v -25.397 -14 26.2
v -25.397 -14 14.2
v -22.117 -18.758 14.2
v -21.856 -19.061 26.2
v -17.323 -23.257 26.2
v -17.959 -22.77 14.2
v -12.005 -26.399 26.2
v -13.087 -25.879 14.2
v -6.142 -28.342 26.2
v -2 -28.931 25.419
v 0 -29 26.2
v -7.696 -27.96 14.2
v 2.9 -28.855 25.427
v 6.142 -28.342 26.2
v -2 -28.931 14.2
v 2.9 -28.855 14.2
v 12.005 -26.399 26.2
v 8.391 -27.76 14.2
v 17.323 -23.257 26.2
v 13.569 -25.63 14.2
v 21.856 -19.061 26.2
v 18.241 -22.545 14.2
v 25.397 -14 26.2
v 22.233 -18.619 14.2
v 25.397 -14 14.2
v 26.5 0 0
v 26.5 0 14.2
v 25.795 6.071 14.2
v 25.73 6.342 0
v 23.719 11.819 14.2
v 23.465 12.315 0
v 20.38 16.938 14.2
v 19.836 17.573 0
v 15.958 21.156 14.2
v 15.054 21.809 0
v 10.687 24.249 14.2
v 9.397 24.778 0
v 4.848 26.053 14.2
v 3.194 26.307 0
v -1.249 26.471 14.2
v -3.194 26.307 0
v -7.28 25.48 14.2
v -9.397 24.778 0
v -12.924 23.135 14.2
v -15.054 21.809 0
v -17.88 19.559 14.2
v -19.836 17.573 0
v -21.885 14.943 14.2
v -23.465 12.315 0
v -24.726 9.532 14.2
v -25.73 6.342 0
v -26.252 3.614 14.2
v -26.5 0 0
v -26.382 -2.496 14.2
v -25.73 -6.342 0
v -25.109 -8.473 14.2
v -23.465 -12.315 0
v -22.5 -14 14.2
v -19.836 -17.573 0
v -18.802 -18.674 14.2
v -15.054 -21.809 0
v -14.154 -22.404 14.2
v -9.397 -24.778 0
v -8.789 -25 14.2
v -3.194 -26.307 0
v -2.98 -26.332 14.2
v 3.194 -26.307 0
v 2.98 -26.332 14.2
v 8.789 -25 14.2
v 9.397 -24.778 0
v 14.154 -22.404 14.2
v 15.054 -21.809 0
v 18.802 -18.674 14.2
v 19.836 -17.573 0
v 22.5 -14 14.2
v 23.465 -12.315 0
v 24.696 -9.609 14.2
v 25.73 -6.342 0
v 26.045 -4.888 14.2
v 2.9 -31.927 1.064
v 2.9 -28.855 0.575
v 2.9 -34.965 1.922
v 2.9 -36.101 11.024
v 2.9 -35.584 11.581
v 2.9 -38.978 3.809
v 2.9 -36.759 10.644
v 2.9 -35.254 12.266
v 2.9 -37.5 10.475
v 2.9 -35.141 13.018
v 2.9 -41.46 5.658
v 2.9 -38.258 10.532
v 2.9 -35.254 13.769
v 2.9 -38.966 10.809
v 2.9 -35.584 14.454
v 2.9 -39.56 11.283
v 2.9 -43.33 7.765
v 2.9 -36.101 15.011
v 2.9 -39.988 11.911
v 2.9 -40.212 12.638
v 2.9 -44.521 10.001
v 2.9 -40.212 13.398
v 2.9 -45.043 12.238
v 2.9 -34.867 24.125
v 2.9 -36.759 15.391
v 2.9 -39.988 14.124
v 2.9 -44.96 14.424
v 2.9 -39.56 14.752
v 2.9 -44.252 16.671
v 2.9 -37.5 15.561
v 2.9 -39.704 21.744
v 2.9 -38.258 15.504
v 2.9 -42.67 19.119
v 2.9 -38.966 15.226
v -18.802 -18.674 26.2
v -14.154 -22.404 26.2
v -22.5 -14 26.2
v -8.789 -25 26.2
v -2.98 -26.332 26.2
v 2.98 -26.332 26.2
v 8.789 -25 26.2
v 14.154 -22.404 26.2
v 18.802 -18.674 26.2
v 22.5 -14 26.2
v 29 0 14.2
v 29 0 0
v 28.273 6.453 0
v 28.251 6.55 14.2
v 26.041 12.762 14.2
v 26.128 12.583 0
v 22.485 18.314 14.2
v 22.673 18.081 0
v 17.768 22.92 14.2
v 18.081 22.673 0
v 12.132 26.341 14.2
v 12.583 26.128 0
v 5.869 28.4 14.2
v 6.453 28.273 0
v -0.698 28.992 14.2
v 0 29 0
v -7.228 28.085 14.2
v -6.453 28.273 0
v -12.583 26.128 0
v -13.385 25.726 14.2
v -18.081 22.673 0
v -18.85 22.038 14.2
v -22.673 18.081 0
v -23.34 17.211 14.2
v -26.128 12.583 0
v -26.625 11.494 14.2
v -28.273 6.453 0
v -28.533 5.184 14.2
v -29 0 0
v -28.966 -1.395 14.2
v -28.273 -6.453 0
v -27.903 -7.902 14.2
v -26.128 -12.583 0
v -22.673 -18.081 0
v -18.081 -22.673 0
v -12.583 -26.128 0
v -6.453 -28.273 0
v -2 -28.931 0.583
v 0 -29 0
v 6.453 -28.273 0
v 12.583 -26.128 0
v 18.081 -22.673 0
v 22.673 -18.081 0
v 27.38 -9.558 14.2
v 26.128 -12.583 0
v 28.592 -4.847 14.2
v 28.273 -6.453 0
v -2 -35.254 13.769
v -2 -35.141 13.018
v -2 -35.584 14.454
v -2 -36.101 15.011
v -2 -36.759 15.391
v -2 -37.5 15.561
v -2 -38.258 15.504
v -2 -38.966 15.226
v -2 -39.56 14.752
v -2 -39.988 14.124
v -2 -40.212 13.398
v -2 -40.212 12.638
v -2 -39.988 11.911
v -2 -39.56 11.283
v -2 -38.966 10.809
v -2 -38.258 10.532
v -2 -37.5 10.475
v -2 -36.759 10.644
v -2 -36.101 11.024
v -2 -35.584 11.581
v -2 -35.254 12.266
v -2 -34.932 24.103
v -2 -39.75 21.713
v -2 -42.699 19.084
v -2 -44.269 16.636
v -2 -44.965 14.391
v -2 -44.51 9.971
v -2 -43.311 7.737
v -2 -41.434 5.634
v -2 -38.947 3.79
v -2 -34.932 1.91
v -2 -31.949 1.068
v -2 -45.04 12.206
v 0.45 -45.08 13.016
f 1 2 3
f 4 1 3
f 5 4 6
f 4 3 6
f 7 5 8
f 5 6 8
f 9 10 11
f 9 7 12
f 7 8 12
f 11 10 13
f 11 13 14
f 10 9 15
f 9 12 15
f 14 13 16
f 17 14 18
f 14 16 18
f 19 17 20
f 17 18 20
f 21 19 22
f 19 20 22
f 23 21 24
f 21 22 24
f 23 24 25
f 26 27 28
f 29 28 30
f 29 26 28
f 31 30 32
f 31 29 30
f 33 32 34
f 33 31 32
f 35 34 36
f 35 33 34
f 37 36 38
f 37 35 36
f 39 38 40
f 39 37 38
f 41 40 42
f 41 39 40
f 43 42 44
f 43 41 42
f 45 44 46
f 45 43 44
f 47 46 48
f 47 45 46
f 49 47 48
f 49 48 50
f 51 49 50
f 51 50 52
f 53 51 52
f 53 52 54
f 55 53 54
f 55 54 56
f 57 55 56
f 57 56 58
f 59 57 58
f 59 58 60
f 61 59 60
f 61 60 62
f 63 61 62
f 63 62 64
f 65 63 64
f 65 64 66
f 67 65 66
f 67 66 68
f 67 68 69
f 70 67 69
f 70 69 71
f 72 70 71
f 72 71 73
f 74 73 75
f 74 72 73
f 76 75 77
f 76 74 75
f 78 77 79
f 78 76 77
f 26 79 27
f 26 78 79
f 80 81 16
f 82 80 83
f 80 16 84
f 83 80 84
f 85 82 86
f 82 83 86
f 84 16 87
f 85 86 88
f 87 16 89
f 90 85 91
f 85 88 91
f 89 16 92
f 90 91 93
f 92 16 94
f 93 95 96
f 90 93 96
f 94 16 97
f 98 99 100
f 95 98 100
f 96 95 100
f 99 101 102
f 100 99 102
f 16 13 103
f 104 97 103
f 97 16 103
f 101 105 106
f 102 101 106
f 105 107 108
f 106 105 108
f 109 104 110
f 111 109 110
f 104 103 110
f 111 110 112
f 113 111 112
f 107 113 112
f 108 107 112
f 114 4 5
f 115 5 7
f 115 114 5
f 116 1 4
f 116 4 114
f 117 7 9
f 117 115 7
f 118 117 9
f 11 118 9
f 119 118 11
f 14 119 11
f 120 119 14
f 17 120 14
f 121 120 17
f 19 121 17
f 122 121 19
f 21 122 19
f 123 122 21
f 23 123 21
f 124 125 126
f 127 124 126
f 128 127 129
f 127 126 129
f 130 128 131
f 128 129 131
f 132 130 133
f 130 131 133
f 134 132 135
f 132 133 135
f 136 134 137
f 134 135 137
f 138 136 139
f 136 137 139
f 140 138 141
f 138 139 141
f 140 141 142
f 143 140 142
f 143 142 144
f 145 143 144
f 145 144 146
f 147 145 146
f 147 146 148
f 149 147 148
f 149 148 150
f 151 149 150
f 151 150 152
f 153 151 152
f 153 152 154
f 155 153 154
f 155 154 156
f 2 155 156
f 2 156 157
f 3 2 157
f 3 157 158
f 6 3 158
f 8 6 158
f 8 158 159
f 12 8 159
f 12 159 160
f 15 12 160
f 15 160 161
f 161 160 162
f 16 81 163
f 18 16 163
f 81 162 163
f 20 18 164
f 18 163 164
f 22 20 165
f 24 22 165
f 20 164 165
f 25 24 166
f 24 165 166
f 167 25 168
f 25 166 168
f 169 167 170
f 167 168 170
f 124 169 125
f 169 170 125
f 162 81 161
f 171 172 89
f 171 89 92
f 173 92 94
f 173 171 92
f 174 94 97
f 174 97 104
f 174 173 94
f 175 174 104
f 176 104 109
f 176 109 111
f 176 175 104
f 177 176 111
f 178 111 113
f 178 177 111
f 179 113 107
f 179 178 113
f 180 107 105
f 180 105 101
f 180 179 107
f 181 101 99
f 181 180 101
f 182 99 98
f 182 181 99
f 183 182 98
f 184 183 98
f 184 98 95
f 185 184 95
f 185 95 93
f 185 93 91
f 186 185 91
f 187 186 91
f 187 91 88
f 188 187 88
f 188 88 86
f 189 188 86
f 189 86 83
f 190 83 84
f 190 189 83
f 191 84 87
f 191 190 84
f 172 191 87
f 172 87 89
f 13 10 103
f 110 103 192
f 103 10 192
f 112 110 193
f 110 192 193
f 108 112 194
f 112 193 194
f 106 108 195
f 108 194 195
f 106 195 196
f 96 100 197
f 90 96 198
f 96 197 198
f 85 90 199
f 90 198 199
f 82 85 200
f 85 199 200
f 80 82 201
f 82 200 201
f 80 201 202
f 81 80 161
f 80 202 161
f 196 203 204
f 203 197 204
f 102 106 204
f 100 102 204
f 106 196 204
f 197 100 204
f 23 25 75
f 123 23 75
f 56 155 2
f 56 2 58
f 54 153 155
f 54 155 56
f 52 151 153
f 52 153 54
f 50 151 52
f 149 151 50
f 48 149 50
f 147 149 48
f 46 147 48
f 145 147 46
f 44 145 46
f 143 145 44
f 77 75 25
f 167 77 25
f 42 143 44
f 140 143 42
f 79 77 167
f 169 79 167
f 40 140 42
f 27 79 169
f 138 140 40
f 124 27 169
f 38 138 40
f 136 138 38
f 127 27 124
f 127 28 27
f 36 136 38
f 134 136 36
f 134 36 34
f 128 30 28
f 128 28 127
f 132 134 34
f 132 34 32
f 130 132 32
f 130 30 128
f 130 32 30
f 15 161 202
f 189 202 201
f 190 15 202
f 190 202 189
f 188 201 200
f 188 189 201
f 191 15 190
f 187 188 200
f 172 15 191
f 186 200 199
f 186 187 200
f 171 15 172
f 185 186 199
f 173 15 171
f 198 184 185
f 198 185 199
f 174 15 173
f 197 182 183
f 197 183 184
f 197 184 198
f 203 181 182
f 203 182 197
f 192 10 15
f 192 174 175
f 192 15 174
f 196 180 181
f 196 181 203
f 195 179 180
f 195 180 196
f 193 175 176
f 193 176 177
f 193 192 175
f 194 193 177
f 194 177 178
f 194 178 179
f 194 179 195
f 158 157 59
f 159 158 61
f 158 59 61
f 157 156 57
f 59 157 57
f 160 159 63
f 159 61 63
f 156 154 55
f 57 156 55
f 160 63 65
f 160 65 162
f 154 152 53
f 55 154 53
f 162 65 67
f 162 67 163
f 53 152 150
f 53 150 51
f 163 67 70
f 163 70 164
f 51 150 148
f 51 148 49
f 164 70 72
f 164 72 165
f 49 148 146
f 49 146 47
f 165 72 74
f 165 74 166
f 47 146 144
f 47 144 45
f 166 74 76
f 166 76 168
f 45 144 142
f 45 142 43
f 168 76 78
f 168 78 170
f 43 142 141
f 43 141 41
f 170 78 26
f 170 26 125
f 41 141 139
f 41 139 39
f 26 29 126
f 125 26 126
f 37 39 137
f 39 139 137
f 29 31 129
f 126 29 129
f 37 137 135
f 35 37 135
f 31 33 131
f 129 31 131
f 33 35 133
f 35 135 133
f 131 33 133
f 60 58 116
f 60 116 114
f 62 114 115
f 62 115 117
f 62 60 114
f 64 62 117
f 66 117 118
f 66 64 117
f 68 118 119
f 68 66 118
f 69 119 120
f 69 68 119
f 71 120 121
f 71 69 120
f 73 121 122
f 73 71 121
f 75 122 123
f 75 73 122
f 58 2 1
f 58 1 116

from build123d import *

# Parameters (mm, degrees)
SKETCH003_R  = 2.55
PAD001_DEPTH = 4.9
SKETCH_R     = 29
SKETCH_R_2   = 26.5
PAD_DEPTH    = 14.2
PAD002_DEPTH = 12


with BuildPart() as uchwyt:
    # Sketch003 → Pad001 (new body)
    with BuildSketch(Plane.YZ):
        with BuildLine():
            Line((-44, 29.5), (-44, 4.5))
            add(Edge.make_bspline(
                [(-44, 29.5), (-61.080011, 28.290286), (-61.080011, 17.016231), (-61.080011, 5.742177), (-44, 4.5)],
                knots=[4.82244, 4.82244, 4.82244, 6.28428, 6.28428, 7.746121, 7.746121, 7.746121], degree=2, weights=[1, 0.74456, 1, 0.74456, 1]))
        make_face()
        with Locations((-53.690757, 17.017669)):
            Circle(SKETCH003_R, mode=Mode.SUBTRACT)
    extrude(amount=PAD001_DEPTH)


with BuildPart() as uchwyt_1:
    # Body001 placement: moved
    add(uchwyt.part.moved(Location((-2, 16, -4))))


with BuildPart() as kubek:
    # Sketch → Pad (new body)
    with BuildSketch(Plane.XY):
        Circle(SKETCH_R)
        Circle(SKETCH_R_2, mode=Mode.SUBTRACT)
    extrude(amount=PAD_DEPTH)

    # Sketch001 (on Face4 of Pad) → Pad002 (join)
    with BuildSketch(Plane.XY.offset(14.2)):
        with BuildLine():
            ThreePointArc((-25.39685, -14), (0, -29), (25.39685, -14))
            Line((25.39685, -14), (22.5, -14))
            ThreePointArc((-22.5, -14), (0, -26.5), (22.5, -14))
            Line((-25.39685, -14), (-22.5, -14))
        make_face()
    extrude(amount=PAD002_DEPTH)

    # Boolean: union Uchwyt
    add(uchwyt_1.part)


solid = kubek.part
